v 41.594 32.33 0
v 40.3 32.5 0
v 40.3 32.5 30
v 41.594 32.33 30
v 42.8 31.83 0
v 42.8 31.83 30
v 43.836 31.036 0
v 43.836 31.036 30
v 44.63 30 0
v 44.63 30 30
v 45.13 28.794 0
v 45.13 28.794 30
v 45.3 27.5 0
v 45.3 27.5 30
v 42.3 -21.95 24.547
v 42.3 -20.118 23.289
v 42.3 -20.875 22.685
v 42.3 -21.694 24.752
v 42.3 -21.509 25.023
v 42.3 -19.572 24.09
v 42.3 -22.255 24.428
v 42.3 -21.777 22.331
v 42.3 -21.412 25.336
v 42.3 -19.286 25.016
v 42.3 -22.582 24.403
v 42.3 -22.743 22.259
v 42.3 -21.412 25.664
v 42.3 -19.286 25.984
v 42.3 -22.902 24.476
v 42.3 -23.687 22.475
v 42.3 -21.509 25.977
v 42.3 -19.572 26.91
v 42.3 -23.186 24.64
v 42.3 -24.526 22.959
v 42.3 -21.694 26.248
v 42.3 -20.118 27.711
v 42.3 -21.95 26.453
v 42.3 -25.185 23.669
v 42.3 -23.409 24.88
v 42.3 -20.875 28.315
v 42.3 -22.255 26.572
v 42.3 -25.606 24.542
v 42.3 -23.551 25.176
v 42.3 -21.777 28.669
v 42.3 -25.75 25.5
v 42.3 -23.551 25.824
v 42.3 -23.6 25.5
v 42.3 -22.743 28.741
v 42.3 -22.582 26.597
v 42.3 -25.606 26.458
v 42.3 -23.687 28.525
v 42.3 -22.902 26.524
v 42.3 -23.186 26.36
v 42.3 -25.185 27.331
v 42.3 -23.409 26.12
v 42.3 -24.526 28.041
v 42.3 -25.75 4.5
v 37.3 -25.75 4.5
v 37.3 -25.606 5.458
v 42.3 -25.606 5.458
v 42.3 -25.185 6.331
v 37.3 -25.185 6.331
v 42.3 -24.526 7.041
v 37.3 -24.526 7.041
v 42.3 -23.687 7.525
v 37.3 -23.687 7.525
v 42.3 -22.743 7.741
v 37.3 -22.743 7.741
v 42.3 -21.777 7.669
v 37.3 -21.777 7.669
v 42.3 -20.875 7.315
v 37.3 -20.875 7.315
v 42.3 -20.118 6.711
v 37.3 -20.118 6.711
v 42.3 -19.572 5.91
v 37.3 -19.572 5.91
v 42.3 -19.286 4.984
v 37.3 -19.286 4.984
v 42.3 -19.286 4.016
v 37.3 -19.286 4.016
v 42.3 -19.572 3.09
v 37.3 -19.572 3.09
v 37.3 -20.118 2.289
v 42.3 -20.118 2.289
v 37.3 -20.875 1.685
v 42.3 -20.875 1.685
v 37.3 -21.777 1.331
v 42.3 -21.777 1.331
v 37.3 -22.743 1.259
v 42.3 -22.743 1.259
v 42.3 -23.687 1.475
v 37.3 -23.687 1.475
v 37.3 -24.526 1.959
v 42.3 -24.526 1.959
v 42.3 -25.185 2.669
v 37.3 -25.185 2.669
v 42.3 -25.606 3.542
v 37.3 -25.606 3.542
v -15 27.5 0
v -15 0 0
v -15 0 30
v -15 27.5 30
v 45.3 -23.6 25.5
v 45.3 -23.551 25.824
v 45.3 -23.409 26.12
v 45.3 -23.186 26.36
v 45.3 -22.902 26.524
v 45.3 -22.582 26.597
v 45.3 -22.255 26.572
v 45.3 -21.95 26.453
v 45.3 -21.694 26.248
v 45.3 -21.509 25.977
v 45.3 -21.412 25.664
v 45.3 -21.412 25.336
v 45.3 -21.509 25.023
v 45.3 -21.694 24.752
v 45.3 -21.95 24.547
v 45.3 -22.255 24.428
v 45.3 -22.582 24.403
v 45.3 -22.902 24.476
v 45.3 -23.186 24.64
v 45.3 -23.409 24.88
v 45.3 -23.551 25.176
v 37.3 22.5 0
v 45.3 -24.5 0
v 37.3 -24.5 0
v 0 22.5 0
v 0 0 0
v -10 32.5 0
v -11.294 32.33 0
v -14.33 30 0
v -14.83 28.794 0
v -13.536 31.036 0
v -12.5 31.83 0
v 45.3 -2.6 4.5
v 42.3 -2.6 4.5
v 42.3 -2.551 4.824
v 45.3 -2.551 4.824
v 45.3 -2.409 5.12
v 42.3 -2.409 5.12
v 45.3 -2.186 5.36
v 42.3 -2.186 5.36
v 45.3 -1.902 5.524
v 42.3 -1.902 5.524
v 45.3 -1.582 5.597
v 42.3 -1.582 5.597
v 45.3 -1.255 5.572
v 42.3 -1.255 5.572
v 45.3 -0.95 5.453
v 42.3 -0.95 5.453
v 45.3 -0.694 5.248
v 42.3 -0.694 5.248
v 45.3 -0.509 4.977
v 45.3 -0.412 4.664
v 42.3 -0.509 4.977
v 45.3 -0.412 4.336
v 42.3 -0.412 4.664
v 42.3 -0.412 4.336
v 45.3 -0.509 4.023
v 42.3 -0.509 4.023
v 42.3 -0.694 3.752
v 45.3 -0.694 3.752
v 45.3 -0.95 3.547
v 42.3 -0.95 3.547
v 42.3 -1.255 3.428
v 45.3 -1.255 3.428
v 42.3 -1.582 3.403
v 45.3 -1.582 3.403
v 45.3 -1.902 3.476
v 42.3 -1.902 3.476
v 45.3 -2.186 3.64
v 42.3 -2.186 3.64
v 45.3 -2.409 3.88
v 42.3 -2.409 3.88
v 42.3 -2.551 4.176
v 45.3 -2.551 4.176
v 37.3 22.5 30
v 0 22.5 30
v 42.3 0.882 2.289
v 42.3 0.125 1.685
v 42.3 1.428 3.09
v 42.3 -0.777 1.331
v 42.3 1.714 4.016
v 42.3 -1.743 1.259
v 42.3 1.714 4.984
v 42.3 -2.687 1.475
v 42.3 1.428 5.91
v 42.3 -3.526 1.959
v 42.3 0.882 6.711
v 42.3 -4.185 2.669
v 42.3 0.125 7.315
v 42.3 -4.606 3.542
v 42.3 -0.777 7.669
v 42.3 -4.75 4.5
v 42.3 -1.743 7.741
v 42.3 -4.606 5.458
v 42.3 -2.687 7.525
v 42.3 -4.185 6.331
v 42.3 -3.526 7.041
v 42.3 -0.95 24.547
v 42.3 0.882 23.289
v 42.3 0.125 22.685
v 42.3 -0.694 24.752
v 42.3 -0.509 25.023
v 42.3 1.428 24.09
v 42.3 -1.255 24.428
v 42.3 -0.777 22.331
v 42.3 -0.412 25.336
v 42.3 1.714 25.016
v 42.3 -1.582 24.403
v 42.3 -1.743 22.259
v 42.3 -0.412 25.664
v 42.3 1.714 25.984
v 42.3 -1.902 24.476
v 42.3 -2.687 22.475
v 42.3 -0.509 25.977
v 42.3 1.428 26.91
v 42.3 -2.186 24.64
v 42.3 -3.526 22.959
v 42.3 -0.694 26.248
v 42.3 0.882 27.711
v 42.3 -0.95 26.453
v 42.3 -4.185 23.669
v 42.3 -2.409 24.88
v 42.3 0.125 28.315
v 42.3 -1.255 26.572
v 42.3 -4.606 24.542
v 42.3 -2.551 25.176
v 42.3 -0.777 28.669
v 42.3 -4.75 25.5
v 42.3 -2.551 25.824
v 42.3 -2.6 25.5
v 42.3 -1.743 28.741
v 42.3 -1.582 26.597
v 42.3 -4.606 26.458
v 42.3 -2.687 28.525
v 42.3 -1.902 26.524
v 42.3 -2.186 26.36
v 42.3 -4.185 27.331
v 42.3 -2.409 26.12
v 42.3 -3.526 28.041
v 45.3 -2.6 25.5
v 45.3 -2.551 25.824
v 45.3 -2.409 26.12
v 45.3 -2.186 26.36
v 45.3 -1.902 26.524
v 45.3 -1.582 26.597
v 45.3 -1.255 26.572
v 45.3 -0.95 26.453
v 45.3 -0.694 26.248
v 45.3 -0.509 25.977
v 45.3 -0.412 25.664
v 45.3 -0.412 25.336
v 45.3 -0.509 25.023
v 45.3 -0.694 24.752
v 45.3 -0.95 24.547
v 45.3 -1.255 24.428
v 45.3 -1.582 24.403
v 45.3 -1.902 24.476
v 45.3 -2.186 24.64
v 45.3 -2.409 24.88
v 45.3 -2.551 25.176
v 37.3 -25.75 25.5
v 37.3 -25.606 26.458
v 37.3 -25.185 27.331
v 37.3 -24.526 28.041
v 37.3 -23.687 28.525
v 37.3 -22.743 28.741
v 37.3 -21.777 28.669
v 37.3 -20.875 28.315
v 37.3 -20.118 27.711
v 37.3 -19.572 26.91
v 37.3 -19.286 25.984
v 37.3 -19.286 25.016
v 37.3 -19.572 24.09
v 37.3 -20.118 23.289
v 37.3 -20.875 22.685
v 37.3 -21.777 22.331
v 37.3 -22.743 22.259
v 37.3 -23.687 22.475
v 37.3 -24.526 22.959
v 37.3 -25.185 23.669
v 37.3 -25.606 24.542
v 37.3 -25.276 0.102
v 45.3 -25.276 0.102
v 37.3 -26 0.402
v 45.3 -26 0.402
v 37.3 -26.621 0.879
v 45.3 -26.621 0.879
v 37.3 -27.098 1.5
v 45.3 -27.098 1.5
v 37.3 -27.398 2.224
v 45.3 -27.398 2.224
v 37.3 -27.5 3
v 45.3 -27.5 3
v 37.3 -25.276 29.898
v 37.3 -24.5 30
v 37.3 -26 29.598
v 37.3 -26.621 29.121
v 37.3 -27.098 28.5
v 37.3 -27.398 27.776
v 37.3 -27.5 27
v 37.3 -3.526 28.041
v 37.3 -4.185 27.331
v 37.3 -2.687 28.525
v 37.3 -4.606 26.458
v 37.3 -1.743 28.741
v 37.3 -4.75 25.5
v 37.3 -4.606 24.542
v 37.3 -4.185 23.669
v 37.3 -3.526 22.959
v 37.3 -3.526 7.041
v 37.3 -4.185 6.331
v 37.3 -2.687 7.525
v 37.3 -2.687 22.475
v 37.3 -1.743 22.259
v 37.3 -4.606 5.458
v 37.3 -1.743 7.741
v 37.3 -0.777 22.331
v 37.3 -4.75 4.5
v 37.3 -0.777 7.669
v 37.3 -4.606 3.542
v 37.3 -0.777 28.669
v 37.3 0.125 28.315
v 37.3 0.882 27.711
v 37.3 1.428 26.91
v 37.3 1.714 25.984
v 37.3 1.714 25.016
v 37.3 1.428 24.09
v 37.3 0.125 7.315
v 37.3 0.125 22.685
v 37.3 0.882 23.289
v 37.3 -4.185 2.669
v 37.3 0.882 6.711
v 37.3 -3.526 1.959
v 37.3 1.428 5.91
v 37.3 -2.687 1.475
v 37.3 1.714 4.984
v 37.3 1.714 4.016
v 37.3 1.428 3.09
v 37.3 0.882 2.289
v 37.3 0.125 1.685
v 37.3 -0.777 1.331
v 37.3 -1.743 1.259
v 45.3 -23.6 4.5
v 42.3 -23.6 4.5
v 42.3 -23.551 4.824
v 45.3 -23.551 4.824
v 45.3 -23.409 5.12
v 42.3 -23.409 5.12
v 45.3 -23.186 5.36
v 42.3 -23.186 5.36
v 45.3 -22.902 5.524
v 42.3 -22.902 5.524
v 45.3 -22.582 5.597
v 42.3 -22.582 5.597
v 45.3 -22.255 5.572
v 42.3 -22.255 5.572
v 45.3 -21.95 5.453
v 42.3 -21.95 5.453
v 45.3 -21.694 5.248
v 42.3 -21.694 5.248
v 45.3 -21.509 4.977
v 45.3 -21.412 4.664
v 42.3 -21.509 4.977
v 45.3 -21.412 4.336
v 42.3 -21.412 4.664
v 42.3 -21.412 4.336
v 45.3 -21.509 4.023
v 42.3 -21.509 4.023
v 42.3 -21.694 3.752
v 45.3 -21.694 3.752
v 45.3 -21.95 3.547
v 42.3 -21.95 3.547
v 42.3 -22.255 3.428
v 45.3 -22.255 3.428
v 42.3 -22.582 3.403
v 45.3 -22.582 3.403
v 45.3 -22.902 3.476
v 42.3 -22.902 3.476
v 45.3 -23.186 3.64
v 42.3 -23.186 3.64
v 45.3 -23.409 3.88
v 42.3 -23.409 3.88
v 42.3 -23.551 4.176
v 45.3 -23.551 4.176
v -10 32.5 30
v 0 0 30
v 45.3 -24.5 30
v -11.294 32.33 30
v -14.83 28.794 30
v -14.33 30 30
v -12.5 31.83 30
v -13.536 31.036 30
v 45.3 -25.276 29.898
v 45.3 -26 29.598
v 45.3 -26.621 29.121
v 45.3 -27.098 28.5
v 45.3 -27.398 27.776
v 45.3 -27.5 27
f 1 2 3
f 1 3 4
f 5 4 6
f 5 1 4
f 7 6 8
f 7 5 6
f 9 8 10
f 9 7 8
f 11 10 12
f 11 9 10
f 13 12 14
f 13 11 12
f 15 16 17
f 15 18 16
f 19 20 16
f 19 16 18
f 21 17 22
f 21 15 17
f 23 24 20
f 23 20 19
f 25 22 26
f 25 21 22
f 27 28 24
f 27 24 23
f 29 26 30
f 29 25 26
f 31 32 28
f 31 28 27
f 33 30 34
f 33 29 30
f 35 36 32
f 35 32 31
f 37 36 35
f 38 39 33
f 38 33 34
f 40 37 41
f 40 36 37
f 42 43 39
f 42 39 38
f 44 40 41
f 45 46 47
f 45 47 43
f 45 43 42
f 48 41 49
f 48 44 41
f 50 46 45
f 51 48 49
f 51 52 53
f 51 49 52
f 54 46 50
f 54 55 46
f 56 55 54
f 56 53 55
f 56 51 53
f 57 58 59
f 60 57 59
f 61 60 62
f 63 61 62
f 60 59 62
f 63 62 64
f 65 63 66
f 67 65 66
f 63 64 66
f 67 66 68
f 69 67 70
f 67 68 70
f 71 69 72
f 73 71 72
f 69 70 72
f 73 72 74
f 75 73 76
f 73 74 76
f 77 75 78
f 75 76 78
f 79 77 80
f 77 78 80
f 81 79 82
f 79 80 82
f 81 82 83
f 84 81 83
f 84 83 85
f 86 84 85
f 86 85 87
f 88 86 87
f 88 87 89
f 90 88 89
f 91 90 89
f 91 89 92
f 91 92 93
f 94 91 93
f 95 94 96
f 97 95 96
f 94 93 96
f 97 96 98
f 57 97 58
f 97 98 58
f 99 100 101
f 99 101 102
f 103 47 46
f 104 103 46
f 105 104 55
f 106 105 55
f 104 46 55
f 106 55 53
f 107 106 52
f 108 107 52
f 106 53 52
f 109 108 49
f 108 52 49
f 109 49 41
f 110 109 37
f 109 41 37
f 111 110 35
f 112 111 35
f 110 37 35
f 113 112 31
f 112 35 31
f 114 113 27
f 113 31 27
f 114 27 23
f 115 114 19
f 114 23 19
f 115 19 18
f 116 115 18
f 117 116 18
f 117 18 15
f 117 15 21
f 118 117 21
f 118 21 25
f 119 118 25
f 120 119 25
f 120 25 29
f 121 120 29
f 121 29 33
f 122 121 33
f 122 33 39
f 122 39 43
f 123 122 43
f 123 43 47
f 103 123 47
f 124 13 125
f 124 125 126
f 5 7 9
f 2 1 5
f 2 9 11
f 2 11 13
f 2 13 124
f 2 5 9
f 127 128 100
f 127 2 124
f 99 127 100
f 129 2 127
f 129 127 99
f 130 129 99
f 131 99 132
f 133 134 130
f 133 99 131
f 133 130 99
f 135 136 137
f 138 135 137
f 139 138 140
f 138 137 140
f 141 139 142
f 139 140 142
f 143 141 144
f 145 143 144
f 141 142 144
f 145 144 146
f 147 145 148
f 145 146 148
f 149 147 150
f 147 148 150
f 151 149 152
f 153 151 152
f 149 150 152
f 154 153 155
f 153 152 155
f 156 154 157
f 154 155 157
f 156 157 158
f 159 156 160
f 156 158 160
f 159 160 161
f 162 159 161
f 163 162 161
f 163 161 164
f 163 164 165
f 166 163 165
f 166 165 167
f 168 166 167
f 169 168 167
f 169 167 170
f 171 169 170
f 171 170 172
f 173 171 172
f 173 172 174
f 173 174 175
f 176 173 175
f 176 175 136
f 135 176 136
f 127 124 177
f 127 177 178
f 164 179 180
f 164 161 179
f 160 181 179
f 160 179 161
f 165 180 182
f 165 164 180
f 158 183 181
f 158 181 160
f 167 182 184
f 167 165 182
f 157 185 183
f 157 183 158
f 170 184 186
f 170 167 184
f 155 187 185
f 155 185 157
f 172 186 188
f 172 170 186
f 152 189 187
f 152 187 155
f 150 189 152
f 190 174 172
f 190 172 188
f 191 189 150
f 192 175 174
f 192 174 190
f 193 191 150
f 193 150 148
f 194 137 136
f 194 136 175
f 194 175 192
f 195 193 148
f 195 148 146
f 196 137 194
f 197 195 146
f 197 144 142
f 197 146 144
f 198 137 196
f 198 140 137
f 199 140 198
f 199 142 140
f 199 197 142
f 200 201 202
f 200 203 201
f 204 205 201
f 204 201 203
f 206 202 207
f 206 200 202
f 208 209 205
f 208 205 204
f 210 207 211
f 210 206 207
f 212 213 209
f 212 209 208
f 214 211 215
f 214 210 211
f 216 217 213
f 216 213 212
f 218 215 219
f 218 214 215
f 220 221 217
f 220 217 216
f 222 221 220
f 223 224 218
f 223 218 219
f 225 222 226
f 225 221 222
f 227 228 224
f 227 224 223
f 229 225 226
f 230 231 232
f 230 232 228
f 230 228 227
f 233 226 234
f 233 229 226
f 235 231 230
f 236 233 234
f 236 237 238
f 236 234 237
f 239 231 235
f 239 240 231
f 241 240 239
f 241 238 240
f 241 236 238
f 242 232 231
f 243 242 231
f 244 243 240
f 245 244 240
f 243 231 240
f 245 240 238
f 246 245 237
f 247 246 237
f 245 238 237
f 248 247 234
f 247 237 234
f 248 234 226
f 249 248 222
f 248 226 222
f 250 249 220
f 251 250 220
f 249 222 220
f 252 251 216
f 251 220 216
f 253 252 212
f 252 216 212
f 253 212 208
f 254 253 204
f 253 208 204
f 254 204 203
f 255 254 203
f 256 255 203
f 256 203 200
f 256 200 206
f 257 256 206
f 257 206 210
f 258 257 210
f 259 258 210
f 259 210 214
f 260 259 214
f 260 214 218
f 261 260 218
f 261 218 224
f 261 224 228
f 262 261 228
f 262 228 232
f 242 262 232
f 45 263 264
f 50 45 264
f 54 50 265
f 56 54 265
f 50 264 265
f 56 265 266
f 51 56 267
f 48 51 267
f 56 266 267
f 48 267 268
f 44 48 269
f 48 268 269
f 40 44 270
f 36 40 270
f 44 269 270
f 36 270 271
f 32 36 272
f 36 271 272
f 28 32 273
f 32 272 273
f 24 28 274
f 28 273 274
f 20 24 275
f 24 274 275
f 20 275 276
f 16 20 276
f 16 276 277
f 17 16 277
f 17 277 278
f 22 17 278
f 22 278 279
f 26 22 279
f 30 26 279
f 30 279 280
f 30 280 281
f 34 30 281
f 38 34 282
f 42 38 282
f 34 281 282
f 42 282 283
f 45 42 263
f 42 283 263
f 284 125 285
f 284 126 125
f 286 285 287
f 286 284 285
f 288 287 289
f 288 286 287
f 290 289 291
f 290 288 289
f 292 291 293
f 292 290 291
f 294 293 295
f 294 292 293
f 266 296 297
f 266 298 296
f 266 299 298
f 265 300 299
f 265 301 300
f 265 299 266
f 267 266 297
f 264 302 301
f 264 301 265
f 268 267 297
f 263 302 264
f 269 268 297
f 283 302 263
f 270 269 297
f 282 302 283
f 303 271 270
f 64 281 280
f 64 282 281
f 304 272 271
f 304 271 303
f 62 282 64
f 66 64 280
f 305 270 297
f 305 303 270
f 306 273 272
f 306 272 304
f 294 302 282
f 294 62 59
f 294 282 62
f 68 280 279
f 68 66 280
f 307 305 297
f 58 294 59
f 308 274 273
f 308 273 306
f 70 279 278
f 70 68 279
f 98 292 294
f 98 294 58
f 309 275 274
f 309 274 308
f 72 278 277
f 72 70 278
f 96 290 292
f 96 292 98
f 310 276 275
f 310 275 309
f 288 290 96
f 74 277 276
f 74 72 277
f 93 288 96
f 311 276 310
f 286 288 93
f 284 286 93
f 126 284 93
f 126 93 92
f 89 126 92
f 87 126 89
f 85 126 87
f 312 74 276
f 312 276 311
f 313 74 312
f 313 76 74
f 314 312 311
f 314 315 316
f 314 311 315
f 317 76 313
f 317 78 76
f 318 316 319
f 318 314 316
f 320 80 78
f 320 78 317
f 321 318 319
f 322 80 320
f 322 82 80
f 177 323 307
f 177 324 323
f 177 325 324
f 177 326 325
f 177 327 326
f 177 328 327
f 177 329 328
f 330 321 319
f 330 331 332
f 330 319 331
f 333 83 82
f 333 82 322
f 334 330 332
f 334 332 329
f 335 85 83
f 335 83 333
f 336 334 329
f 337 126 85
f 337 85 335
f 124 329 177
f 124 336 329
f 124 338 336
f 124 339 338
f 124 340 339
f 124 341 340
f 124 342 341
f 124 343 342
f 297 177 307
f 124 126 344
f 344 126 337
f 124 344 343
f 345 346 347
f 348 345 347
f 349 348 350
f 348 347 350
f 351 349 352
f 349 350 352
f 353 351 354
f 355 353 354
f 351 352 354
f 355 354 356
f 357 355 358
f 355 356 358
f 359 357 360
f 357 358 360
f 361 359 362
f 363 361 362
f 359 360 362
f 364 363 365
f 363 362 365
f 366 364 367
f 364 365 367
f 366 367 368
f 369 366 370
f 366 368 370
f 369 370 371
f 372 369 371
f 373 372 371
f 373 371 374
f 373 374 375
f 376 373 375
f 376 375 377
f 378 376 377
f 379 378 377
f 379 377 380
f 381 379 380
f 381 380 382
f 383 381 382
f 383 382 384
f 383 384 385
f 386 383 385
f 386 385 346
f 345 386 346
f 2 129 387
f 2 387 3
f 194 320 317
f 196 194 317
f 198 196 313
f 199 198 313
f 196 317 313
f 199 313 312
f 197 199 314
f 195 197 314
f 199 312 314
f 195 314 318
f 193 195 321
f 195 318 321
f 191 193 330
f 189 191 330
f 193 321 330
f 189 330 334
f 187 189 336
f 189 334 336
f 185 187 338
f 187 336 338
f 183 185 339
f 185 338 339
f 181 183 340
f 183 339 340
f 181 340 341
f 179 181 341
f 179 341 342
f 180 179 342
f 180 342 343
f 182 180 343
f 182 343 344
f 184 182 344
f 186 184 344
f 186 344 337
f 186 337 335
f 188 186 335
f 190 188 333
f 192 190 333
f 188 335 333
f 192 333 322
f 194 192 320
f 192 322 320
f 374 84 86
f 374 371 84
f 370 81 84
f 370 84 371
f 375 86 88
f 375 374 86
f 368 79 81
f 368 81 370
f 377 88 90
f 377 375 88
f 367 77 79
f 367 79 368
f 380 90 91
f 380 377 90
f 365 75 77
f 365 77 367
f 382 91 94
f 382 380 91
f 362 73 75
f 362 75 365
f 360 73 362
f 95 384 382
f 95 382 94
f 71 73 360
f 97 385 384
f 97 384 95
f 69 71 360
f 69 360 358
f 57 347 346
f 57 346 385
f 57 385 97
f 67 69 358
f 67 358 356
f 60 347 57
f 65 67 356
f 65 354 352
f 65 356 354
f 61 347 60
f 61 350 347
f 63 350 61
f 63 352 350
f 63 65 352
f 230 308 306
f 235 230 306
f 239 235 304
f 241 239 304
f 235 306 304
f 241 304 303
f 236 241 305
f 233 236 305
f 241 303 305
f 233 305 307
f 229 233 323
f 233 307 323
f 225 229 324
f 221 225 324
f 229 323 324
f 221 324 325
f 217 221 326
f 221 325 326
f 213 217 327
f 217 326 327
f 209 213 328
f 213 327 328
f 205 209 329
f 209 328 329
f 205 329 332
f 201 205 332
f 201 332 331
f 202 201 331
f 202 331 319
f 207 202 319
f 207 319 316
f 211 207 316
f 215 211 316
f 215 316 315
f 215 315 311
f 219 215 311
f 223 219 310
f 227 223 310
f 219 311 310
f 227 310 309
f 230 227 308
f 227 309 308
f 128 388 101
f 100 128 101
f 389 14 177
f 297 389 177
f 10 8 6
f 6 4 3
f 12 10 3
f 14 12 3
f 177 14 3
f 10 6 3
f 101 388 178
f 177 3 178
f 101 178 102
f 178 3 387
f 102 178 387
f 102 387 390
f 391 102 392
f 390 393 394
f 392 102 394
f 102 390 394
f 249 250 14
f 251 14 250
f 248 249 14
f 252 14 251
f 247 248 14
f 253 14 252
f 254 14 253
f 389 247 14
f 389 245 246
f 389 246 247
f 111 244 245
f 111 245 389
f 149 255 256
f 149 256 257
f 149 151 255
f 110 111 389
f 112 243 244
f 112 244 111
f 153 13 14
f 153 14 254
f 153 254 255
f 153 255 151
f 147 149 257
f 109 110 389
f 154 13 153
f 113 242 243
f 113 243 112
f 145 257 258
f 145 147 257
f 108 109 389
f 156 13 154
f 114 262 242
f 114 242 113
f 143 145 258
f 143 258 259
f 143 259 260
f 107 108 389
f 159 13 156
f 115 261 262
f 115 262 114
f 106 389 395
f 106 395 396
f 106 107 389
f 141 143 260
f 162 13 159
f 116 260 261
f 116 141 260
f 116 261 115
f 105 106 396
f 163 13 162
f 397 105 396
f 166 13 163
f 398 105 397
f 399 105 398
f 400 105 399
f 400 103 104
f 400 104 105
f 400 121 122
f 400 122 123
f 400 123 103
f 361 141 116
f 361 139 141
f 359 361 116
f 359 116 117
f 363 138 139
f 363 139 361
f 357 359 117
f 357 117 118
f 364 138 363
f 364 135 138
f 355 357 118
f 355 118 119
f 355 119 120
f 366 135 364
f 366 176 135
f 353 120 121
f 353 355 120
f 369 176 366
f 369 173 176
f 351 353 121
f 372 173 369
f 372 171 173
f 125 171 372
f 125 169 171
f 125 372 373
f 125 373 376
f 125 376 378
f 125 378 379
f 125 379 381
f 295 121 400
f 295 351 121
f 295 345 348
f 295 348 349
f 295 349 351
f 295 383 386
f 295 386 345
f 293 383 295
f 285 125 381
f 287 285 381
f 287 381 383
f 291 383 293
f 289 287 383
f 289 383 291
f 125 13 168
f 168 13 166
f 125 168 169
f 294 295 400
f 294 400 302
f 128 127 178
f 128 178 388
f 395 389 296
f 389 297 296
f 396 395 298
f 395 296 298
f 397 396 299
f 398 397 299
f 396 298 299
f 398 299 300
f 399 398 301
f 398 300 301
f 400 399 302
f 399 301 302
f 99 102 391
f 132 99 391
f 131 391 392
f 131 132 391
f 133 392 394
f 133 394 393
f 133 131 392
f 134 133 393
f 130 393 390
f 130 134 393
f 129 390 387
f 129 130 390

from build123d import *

# Parameters (mm, degrees)
EXTRUDE_1_DEPTH     = 30
SKETCH_2_R          = 1.1
CUT_EXTRUDE_1_DEPTH = 69.494817322
FILLET_1_R          = 3
SKETCH_3_R          = 3.25
CUT_EXTRUDE_2_DEPTH = 5


with BuildPart() as part:
    # ｽｹｯﾁ1 → ﾎﾞｽ - 押し出し1 (new body)
    with BuildSketch(Plane.XY):
        with BuildLine():
            ThreePointArc((-15, 27.5), (-13.535533906, 31.035533906), (-10, 32.5))
            Line((-10, 32.5), (40.3, 32.5))
            ThreePointArc((40.3, 32.5), (43.835533906, 31.035533906), (45.3, 27.5))
            Line((45.3, 27.5), (45.3, -27.5))
            Line((45.3, -27.5), (37.3, -27.5))
            Line((37.3, -27.5), (37.3, 22.5))
            Line((37.3, 22.5), (0, 22.5))
            Line((0, 22.5), (0, 0))
            Line((0, 0), (-15, 0))
            Line((-15, 0), (-15, 27.5))
        make_face()
    extrude(amount=EXTRUDE_1_DEPTH)

    # ｽｹｯﾁ2 → ｶｯﾄ - 押し出し1 (cut, through all)
    with BuildSketch(Plane.ZY.offset(-37.3)):
        with Locations(Location((4.5, -22.5, 0), (0, 0, 270))):
            Circle(SKETCH_2_R)
        with Locations(Location((25.5, -22.5, 0), (0, 0, 270))):
            Circle(SKETCH_2_R)
        with Locations(Location((4.5, -1.5, 0), (0, 0, 270))):
            Circle(SKETCH_2_R)
        with Locations(Location((25.5, -1.5, 0), (0, 0, 270))):
            Circle(SKETCH_2_R)
    extrude(amount=-CUT_EXTRUDE_1_DEPTH, mode=Mode.SUBTRACT)

    # ﾌｨﾚｯﾄ1
    fillet_1_edges = [part.edges().sort_by_distance(p)[0] for p in [
        (41.3, -27.5, 0),
        (41.3, -27.5, 30),
    ]]
    fillet(fillet_1_edges, radius=FILLET_1_R)

    # ｽｹｯﾁ3 → ｶｯﾄ - 押し出し2 (cut)
    with BuildSketch(Plane.ZY.offset(-37.3)):
        with Locations(Location((4.5, -22.5, 0), (0, 0, 270))):
            Circle(SKETCH_3_R)
        with Locations(Location((25.5, -22.5, 0), (0, 0, 270))):
            Circle(SKETCH_3_R)
        with Locations(Location((4.5, -1.5, 0), (0, 0, 270))):
            Circle(SKETCH_3_R)
        with Locations(Location((25.5, -1.5, 0), (0, 0, 270))):
            Circle(SKETCH_3_R)
    extrude(amount=-CUT_EXTRUDE_2_DEPTH, mode=Mode.SUBTRACT)


solid = part.part
